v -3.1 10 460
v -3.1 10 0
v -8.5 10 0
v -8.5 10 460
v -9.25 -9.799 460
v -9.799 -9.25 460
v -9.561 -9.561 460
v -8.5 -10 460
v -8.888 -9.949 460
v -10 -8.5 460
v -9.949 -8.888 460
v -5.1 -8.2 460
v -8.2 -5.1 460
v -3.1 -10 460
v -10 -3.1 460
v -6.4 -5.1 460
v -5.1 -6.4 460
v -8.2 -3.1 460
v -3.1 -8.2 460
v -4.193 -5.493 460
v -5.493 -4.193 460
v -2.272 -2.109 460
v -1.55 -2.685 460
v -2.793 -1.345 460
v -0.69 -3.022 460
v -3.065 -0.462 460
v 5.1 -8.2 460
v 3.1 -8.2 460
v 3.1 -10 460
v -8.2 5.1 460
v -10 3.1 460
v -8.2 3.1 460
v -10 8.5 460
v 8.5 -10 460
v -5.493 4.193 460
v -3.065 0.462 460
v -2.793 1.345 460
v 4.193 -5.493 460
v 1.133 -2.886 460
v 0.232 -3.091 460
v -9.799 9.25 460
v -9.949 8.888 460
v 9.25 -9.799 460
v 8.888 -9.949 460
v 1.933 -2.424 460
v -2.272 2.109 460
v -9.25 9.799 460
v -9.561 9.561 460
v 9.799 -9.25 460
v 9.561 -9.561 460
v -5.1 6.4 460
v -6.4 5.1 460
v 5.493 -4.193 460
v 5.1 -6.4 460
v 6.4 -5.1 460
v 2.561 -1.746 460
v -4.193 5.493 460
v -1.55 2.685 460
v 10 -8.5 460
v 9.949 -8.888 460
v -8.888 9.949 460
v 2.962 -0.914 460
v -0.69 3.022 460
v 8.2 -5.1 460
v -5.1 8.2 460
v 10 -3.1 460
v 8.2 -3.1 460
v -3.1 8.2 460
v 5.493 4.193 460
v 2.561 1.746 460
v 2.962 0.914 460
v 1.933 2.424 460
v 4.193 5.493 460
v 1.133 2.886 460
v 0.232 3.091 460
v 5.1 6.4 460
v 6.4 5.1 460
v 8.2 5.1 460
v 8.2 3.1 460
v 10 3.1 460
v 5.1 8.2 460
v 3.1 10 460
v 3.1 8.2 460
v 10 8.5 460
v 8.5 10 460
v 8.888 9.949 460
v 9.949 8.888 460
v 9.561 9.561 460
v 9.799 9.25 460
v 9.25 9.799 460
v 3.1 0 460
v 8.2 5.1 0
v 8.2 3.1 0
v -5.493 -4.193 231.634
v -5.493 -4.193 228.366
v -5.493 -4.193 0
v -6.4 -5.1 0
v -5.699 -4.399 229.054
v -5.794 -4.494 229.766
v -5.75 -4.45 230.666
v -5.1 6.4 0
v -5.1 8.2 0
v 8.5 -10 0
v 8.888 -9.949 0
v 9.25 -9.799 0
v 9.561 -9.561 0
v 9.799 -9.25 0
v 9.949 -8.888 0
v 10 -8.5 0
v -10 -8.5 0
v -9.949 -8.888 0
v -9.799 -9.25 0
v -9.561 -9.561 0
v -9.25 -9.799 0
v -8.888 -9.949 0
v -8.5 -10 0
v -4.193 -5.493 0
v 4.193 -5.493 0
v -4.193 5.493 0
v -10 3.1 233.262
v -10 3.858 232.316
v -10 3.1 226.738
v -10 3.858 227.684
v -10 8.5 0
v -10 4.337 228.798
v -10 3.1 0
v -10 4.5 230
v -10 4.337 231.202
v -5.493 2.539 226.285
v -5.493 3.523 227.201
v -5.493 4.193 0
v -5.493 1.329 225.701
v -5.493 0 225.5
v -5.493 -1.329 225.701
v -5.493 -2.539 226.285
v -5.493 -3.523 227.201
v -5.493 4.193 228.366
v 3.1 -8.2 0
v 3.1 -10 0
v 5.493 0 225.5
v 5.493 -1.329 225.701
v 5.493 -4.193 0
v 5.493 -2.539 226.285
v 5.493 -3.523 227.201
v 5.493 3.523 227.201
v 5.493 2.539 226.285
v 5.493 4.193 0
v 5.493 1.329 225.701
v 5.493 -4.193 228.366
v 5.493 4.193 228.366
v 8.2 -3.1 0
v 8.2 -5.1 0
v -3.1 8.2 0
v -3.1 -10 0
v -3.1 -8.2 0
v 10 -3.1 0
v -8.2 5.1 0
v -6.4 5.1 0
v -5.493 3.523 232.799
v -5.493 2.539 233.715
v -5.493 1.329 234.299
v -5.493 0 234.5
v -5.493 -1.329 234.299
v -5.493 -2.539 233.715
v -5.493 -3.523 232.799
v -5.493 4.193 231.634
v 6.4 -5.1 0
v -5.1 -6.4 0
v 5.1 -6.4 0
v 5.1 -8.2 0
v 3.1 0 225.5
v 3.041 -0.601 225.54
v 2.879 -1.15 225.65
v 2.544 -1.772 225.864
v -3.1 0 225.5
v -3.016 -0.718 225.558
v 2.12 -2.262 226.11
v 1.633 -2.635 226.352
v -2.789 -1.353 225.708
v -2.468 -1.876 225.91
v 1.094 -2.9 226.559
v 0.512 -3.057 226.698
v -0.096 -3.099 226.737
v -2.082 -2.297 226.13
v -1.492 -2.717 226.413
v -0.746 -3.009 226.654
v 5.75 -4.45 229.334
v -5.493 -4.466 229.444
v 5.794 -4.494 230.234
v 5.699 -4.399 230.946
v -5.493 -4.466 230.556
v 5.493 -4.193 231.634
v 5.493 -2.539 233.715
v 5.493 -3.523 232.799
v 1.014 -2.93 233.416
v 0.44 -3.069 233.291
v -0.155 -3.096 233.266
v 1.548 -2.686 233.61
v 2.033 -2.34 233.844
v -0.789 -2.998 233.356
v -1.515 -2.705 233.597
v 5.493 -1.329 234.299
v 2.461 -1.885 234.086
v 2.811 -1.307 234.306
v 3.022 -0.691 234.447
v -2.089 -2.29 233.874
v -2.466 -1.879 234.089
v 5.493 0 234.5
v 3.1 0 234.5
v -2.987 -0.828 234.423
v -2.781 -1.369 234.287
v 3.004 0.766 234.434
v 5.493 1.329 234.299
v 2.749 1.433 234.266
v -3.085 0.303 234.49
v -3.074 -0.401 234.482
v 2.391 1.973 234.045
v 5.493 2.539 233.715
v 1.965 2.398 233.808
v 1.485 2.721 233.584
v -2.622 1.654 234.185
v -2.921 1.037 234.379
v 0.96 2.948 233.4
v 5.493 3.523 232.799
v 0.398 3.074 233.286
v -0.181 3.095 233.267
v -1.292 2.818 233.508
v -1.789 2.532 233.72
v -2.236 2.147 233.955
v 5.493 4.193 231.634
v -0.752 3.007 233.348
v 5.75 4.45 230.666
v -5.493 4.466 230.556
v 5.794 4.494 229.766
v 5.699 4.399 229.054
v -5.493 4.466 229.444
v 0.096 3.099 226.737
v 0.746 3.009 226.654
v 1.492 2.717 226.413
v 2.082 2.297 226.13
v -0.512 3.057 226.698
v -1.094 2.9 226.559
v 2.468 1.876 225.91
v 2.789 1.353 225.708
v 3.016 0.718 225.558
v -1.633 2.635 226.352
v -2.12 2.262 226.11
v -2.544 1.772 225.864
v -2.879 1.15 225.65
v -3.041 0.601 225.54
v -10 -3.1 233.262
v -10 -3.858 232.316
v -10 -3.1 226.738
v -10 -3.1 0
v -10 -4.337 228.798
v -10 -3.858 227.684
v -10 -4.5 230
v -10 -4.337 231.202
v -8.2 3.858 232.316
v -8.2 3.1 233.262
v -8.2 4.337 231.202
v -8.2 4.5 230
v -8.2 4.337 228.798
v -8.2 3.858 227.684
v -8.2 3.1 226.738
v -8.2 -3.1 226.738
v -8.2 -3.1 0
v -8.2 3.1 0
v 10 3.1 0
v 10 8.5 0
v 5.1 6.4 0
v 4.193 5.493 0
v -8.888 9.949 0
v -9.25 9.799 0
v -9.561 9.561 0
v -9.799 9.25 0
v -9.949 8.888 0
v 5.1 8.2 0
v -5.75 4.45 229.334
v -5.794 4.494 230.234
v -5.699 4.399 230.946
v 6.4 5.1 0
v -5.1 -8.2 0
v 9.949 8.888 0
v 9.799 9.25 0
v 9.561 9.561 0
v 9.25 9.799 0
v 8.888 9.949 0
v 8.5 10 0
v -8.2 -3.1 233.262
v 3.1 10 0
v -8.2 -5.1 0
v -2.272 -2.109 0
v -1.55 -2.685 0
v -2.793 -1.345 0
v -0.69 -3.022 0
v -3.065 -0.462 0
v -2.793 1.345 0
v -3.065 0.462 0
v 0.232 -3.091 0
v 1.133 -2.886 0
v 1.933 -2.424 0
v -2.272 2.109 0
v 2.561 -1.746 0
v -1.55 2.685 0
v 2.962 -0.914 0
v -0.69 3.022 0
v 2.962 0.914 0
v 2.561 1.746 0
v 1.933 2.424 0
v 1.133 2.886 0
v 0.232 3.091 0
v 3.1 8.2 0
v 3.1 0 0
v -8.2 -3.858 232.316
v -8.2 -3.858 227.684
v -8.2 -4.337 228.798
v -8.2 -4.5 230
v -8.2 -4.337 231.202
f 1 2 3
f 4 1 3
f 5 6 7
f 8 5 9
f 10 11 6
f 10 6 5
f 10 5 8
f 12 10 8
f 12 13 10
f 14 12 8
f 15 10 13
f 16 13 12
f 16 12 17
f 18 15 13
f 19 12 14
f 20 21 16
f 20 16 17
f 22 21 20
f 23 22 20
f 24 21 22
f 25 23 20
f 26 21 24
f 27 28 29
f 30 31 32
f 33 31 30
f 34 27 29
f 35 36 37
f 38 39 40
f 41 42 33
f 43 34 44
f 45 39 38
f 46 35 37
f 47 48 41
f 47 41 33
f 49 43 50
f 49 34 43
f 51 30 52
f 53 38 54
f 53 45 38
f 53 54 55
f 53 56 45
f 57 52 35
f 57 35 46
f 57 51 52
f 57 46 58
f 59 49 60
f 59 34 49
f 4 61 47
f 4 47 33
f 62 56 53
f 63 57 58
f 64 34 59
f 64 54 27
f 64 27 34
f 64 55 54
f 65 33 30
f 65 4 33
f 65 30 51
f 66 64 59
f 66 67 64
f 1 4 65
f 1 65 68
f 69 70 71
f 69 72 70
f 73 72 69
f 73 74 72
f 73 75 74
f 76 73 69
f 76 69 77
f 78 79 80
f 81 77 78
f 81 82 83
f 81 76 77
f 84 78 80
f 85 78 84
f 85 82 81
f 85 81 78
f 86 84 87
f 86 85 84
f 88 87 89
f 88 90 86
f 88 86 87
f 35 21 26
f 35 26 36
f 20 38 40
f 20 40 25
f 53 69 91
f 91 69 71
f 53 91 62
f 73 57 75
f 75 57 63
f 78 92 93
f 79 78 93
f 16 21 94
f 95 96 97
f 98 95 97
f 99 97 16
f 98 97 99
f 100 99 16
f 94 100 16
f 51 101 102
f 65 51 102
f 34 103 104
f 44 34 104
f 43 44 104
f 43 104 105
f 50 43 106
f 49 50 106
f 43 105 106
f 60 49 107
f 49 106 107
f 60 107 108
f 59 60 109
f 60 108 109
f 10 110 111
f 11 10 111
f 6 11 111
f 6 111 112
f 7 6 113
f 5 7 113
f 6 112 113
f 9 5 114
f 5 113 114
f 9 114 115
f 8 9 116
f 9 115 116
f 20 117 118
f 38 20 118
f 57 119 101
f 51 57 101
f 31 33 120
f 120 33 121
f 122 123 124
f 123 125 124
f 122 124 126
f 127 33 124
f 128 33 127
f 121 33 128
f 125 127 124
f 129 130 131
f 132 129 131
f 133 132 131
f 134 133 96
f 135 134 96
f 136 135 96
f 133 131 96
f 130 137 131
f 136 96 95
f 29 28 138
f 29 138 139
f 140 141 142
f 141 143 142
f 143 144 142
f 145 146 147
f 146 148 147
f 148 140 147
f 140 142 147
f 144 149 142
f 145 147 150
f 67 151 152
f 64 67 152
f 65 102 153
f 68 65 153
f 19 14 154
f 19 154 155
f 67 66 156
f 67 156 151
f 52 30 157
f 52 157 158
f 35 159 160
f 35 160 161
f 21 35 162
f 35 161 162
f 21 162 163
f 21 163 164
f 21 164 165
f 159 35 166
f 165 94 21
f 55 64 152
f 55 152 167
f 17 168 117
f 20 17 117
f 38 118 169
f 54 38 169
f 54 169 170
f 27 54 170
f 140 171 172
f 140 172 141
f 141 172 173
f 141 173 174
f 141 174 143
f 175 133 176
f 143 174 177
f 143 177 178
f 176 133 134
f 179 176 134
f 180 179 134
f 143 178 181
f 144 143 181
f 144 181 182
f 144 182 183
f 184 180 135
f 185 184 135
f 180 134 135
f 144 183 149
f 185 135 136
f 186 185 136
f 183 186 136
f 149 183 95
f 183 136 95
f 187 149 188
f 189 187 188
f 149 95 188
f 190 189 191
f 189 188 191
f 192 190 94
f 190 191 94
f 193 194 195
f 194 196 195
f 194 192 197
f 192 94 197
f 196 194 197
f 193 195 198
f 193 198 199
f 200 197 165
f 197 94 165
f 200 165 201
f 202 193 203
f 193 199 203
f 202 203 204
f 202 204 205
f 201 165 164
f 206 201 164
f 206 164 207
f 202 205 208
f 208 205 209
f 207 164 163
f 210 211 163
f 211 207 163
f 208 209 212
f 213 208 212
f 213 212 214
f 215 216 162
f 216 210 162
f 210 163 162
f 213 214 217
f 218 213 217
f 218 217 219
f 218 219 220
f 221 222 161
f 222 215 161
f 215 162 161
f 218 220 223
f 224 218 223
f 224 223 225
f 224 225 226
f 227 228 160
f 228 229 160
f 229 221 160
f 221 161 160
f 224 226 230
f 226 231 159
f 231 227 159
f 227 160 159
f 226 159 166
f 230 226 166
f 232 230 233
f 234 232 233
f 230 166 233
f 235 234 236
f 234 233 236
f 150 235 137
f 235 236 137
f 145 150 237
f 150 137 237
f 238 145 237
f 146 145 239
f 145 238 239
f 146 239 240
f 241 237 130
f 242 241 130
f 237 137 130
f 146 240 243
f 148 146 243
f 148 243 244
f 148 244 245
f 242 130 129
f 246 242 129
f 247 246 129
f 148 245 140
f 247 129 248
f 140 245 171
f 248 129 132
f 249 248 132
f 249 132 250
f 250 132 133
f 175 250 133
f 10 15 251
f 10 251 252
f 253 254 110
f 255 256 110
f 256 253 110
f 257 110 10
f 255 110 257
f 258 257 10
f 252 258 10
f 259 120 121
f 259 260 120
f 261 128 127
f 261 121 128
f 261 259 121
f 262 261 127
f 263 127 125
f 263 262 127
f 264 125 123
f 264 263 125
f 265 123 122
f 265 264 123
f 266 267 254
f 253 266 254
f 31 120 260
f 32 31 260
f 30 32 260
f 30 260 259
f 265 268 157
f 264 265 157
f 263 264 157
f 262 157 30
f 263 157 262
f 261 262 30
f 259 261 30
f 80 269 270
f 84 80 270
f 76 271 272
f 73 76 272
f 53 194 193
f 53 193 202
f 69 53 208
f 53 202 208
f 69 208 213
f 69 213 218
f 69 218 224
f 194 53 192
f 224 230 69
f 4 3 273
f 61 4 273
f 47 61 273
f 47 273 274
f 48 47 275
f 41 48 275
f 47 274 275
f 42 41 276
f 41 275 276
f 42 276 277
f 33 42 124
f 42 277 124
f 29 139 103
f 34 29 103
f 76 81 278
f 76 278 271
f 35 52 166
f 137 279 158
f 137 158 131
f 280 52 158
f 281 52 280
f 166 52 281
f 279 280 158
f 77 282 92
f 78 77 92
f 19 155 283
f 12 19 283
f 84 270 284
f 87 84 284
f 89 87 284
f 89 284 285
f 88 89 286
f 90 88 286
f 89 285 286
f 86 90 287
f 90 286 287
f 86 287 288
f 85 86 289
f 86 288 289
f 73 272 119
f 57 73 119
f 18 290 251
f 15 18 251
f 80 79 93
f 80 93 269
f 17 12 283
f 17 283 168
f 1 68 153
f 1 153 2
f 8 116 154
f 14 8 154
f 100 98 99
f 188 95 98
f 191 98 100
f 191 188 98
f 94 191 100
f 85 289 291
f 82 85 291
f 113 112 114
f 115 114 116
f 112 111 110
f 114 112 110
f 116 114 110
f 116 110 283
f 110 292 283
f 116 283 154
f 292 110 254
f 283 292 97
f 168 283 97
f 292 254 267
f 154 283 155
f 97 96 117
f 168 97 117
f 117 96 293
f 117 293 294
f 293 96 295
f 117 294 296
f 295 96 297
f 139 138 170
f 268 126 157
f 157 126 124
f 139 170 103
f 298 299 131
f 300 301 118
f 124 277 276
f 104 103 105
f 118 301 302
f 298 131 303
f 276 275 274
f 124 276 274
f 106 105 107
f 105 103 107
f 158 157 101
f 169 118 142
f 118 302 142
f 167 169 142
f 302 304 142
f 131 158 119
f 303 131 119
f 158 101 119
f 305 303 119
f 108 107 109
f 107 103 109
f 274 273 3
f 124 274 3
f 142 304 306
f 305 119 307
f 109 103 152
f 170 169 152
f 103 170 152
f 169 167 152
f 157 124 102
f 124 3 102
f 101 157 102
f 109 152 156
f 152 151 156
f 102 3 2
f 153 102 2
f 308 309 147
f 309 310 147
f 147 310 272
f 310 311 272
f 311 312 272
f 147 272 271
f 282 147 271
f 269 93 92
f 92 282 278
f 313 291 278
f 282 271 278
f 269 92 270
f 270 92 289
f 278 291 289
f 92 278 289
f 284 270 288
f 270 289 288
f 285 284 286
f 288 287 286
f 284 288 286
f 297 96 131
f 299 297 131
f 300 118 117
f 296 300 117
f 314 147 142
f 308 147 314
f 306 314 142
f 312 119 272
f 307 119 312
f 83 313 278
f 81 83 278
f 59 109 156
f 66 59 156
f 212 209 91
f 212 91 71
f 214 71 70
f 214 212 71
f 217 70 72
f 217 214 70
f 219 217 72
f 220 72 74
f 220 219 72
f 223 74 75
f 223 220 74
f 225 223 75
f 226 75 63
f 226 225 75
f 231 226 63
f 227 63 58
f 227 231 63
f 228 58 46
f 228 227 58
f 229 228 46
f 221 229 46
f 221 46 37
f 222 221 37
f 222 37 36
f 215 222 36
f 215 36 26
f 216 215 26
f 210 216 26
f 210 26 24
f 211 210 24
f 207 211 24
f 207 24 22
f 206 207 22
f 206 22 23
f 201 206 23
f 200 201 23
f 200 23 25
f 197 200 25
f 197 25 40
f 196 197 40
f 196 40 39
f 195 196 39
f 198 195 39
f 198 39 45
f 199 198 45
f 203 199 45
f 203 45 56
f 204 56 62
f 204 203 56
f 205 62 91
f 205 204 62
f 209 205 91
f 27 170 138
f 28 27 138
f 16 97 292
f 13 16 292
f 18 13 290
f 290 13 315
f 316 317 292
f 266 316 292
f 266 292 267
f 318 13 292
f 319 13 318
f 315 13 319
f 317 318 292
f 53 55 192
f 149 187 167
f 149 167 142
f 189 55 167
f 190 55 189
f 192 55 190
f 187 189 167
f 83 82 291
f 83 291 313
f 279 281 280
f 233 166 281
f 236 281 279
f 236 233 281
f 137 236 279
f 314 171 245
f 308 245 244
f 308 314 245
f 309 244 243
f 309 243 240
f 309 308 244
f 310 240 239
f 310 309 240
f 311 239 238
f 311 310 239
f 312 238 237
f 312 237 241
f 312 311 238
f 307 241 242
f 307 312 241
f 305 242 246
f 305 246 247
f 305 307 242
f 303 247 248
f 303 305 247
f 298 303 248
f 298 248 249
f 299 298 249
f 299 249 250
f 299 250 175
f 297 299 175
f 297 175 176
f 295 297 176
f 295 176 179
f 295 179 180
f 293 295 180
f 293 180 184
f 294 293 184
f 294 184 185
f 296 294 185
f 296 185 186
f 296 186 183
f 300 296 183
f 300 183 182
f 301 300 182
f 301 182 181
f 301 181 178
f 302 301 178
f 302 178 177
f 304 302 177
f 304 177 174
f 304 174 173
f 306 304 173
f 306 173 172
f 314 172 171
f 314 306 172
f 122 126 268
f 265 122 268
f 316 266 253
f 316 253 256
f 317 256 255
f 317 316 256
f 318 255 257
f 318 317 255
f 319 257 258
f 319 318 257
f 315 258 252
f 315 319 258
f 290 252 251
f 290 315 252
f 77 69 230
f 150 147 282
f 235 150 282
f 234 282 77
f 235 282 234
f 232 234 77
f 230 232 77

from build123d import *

# Parameters (mm, degrees)
SKETCH1_R               = 3.1
BOSS_EXTRUDE1_DEPTH     = 460
SKETCH5_R               = 4.5
CUT_EXTRUDE2_DEPTH      = 5.507107651
CUT_EXTRUDE2_DEPTH_BACK = 12


with BuildPart() as part:
    # Sketch1 → Boss-Extrude1 (new body)
    with BuildSketch(Plane.XY):
        with BuildLine():
            Line((-10, 3.1), (-8.2, 3.1))
            Line((-8.2, 3.1), (-8.2, 5.1))
            Line((-8.2, 5.1), (-6.4, 5.1))
            Line((-6.4, 5.1), (-5.492892349, 4.192892349))
            Line((-5.492892349, 4.192892349), (-5.492892349, -4.192892349))
            Line((-5.492892349, -4.192892349), (-6.4, -5.1))
            Line((-6.4, -5.1), (-8.2, -5.1))
            Line((-8.2, -5.1), (-8.2, -3.1))
            Line((-8.2, -3.1), (-10, -3.1))
            Line((-10, -3.1), (-10, -8.5))
            ThreePointArc((-10, -8.5), (-9.560660172, -9.560660172), (-8.5, -10))
            Line((-8.5, -10), (-3.1, -10))
            Line((-3.1, -10), (-3.1, -8.2))
            Line((-3.1, -8.2), (-5.1, -8.2))
            Line((-5.1, -8.2), (-5.1, -6.4))
            Line((-5.1, -6.4), (-4.192892349, -5.492892349))
            Line((-4.192892349, -5.492892349), (4.192892349, -5.492892349))
            Line((4.192892349, -5.492892349), (5.1, -6.4))
            Line((5.1, -6.4), (5.1, -8.2))
            Line((5.1, -8.2), (3.1, -8.2))
            Line((3.1, -8.2), (3.1, -10))
            Line((3.1, -10), (8.5, -10))
            ThreePointArc((8.5, -10), (9.560660172, -9.560660172), (10, -8.5))
            Line((10, -8.5), (10, -3.1))
            Line((10, -3.1), (8.2, -3.1))
            Line((8.2, -3.1), (8.2, -5.1))
            Line((8.2, -5.1), (6.4, -5.1))
            Line((6.4, -5.1), (5.492892349, -4.192892349))
            Line((5.492892349, -4.192892349), (5.492892349, 4.192892349))
            Line((5.492892349, 4.192892349), (6.4, 5.1))
            Line((6.4, 5.1), (8.2, 5.1))
            Line((8.2, 5.1), (8.2, 3.1))
            Line((8.2, 3.1), (10, 3.1))
            Line((10, 3.1), (10, 8.5))
            ThreePointArc((10, 8.5), (9.560660172, 9.560660172), (8.5, 10))
            Line((8.5, 10), (3.1, 10))
            Line((3.1, 10), (3.1, 8.2))
            Line((3.1, 8.2), (5.1, 8.2))
            Line((5.1, 8.2), (5.1, 6.4))
            Line((5.1, 6.4), (4.192892349, 5.492892349))
            Line((4.192892349, 5.492892349), (-4.192892349, 5.492892349))
            Line((-4.192892349, 5.492892349), (-5.1, 6.4))
            Line((-5.1, 6.4), (-5.1, 8.2))
            Line((-5.1, 8.2), (-3.1, 8.2))
            Line((-3.1, 8.2), (-3.1, 10))
            Line((-3.1, 10), (-8.5, 10))
            ThreePointArc((-8.5, 10), (-9.560660172, 9.560660172), (-10, 8.5))
            Line((-10, 8.5), (-10, 3.1))
        make_face()
        Circle(SKETCH1_R, mode=Mode.SUBTRACT)
    extrude(amount=BOSS_EXTRUDE1_DEPTH)

    # Sketch5 → Cut-Extrude2 (cut, two sides)
    with BuildSketch(Plane(origin=(-5.492892349, 0, 0), x_dir=(0, 0, -1), z_dir=(-1, 0, 0))) as cut_extrude2_sk:
        with Locations((-230, 0)):
            Circle(SKETCH5_R)
    extrude(amount=CUT_EXTRUDE2_DEPTH, mode=Mode.SUBTRACT)
    extrude(cut_extrude2_sk.sketch, amount=-CUT_EXTRUDE2_DEPTH_BACK, mode=Mode.SUBTRACT)


solid = part.part
